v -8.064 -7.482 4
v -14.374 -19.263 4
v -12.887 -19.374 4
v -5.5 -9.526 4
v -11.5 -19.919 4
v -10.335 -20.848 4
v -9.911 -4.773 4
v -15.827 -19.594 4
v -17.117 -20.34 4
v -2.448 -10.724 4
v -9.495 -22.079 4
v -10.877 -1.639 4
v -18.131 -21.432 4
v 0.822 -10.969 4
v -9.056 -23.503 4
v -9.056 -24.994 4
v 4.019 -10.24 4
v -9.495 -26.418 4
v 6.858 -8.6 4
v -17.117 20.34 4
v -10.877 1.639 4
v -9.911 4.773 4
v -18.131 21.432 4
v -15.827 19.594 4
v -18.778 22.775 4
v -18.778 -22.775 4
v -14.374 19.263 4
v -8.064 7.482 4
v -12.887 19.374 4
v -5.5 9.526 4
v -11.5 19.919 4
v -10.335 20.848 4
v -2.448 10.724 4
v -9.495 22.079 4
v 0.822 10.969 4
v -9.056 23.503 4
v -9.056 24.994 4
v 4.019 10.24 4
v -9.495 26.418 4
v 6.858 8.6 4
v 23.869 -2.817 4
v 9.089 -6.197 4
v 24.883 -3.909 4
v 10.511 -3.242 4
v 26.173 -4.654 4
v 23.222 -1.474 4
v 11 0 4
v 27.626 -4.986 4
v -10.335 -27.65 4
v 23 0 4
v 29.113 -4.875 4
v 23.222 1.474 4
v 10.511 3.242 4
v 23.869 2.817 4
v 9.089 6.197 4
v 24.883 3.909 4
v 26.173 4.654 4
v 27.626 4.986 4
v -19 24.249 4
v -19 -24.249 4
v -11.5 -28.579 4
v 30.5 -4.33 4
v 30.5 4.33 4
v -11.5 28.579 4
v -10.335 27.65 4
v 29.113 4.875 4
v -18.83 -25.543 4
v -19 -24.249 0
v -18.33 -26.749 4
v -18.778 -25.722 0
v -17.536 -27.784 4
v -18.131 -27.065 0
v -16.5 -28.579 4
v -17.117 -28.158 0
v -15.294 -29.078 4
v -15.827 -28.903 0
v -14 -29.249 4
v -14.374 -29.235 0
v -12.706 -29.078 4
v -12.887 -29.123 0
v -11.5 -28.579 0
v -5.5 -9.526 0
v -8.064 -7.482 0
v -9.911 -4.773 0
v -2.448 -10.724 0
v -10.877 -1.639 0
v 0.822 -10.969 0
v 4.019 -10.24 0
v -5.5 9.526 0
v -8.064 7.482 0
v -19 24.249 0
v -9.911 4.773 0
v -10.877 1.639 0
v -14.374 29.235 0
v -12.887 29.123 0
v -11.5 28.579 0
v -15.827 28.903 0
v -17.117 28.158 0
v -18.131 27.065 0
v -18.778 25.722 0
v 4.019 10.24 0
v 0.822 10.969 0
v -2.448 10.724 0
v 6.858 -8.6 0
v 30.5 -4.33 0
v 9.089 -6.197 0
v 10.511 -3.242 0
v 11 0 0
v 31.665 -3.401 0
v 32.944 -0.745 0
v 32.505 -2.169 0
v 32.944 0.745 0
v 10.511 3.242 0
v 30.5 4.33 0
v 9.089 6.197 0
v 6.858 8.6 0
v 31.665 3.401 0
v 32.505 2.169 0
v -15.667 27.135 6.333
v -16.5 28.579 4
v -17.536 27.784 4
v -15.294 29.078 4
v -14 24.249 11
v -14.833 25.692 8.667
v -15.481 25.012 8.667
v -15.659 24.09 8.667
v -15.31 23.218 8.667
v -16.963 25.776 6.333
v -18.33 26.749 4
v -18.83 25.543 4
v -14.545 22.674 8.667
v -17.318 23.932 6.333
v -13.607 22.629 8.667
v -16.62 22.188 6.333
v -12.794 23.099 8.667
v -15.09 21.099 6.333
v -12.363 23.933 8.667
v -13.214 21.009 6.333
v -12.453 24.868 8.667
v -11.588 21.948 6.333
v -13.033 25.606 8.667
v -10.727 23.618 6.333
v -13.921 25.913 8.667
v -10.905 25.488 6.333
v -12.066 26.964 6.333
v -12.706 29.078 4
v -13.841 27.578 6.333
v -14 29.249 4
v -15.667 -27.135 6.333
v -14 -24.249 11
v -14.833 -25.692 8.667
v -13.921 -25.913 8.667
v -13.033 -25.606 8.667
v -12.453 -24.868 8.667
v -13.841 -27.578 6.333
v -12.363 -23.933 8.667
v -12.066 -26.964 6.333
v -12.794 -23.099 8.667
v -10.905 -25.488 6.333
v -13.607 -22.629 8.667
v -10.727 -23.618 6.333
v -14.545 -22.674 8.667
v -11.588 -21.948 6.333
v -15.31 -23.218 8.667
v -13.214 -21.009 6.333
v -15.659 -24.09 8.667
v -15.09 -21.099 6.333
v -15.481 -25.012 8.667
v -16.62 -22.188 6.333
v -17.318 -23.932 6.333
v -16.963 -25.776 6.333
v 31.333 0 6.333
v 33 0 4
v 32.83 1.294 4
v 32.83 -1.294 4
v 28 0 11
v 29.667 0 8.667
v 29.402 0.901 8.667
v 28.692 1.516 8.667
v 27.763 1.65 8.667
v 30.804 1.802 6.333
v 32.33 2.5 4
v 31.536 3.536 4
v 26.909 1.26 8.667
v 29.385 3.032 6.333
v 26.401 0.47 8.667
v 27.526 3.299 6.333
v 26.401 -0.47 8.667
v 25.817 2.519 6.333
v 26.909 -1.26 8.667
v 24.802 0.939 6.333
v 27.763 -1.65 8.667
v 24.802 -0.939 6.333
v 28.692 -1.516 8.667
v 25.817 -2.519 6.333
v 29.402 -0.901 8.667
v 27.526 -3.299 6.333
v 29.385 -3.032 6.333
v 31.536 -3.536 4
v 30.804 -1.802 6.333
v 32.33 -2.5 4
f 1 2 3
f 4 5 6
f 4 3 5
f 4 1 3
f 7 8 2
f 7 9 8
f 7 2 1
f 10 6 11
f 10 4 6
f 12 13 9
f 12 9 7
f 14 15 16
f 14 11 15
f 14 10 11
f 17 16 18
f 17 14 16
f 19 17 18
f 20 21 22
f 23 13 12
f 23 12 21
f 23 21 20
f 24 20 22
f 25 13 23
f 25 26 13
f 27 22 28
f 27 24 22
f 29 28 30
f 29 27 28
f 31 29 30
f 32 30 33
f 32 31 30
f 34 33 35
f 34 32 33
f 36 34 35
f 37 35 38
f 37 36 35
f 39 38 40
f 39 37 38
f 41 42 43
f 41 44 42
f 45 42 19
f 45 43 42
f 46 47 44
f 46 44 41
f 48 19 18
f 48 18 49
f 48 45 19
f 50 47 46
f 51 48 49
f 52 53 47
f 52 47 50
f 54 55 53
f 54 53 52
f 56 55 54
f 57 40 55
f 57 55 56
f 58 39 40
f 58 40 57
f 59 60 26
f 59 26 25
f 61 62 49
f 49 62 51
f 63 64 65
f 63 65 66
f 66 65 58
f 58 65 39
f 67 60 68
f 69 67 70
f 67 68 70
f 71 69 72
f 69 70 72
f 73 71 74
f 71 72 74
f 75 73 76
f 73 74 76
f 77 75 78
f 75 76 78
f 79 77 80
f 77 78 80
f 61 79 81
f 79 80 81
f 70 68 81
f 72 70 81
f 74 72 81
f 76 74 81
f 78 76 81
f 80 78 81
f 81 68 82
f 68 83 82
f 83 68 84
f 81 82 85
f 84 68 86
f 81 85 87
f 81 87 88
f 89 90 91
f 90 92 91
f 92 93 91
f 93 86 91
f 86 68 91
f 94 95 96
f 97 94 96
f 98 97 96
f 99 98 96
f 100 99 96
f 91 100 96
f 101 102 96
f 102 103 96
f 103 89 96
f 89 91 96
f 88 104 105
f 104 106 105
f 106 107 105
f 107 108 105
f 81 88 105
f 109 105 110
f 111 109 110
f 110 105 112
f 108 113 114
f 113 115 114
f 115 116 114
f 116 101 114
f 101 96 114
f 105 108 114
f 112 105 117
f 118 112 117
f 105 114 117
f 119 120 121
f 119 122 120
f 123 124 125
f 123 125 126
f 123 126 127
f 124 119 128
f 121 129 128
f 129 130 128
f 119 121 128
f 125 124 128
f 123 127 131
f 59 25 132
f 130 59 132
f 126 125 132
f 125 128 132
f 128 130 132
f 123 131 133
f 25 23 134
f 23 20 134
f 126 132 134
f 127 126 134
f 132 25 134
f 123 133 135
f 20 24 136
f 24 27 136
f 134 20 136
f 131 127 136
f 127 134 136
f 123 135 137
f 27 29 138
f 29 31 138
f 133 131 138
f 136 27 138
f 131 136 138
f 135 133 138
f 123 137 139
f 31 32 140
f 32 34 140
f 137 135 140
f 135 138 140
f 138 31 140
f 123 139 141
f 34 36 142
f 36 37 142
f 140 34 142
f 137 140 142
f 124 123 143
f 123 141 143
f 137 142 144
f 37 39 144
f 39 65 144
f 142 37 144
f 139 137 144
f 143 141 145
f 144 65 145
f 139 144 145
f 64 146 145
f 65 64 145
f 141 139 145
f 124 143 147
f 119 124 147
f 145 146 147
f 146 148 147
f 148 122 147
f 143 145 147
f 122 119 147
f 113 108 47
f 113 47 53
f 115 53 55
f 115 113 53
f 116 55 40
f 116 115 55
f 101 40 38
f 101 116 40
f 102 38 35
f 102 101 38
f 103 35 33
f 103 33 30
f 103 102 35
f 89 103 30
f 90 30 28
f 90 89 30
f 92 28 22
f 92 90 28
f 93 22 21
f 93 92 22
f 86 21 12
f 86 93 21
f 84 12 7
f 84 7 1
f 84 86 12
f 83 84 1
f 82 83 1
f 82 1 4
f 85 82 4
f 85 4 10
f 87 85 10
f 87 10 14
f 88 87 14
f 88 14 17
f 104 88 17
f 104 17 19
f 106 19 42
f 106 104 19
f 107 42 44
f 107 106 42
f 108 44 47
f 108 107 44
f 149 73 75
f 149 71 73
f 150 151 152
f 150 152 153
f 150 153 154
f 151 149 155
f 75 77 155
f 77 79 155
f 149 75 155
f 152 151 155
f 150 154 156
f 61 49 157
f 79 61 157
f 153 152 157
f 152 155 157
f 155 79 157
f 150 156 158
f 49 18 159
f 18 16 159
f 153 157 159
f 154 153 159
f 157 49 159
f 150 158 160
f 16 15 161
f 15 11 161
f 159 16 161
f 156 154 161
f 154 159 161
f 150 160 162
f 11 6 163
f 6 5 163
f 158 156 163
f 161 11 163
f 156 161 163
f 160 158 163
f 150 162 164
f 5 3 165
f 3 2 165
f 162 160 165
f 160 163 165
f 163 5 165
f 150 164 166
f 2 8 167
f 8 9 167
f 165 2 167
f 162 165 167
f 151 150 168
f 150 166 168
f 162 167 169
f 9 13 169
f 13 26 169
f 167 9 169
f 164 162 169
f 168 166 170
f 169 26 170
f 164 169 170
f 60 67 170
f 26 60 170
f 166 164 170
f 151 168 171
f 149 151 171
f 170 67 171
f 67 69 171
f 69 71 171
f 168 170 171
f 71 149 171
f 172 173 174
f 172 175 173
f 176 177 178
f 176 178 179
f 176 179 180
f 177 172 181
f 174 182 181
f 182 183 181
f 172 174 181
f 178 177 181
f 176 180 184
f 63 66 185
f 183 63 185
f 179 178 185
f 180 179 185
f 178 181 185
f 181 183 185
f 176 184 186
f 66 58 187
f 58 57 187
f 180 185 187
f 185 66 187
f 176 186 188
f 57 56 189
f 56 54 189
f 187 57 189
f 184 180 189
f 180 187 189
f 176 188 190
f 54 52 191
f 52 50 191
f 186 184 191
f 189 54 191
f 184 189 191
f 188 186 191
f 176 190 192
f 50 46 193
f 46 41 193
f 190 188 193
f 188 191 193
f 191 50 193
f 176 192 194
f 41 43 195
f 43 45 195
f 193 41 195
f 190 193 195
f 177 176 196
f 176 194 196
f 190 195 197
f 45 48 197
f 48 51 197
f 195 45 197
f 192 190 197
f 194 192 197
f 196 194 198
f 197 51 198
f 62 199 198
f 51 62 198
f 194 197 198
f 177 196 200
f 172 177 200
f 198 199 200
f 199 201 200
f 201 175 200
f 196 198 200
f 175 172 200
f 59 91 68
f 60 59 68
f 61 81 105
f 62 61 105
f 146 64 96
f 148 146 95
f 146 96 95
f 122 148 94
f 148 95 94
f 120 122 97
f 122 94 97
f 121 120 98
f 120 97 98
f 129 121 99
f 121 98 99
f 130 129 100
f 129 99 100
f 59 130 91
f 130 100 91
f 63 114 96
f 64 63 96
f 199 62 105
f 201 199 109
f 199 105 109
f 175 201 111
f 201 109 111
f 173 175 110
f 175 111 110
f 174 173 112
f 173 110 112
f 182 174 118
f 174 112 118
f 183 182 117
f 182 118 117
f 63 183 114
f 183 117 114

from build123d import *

# Parameters (mm, degrees)
ARRAY_COUNT   = 3
SKETCH_R      = 11
EXTRUDE_DEPTH = 4


with BuildPart() as array:
    # Sketch001 → Revolve (revolve)
    with BuildSketch(Plane.XZ):
        Polygon((0, 0), (0, 7), (5, 0), align=None)
    revolve(axis=Axis((0, 0, 4), (0, 0, 1)))

    # Array: Array ×3 about axis
    array_axis = Axis((-28, 0, 0), (0, 0, 1))


with BuildPart() as array_1:
    add(array.part)
    for i in range(1, ARRAY_COUNT):
        add(array.part.rotate(array_axis, i * 360 / ARRAY_COUNT))


with BuildPart() as array_2:
    # Array placement: moved
    add(array_1.part.moved(Location((28, 0, 4))))


with BuildPart() as fusion:
    # Sketch → Extrude (new body)
    with BuildSketch(Plane.XY):
        with BuildLine():
            Line((-19, 24.248711), (-19, -24.248711))
            ThreePointArc((-19, -24.248711), (-16.5, -28.578838), (-11.5, -28.578838))
            Line((-11.5, -28.578838), (30.5, -4.330127))
            ThreePointArc((30.5, -4.330127), (33, 0), (30.5, 4.330127))
            Line((30.5, 4.330127), (-11.5, 28.578838))
            ThreePointArc((-11.5, 28.578838), (-16.5, 28.578838), (-19, 24.248711))
        make_face()
        Circle(SKETCH_R, mode=Mode.SUBTRACT)
    extrude(amount=EXTRUDE_DEPTH)

    # Fusion: union Array
    add(array_2.part)


solid = fusion.part
